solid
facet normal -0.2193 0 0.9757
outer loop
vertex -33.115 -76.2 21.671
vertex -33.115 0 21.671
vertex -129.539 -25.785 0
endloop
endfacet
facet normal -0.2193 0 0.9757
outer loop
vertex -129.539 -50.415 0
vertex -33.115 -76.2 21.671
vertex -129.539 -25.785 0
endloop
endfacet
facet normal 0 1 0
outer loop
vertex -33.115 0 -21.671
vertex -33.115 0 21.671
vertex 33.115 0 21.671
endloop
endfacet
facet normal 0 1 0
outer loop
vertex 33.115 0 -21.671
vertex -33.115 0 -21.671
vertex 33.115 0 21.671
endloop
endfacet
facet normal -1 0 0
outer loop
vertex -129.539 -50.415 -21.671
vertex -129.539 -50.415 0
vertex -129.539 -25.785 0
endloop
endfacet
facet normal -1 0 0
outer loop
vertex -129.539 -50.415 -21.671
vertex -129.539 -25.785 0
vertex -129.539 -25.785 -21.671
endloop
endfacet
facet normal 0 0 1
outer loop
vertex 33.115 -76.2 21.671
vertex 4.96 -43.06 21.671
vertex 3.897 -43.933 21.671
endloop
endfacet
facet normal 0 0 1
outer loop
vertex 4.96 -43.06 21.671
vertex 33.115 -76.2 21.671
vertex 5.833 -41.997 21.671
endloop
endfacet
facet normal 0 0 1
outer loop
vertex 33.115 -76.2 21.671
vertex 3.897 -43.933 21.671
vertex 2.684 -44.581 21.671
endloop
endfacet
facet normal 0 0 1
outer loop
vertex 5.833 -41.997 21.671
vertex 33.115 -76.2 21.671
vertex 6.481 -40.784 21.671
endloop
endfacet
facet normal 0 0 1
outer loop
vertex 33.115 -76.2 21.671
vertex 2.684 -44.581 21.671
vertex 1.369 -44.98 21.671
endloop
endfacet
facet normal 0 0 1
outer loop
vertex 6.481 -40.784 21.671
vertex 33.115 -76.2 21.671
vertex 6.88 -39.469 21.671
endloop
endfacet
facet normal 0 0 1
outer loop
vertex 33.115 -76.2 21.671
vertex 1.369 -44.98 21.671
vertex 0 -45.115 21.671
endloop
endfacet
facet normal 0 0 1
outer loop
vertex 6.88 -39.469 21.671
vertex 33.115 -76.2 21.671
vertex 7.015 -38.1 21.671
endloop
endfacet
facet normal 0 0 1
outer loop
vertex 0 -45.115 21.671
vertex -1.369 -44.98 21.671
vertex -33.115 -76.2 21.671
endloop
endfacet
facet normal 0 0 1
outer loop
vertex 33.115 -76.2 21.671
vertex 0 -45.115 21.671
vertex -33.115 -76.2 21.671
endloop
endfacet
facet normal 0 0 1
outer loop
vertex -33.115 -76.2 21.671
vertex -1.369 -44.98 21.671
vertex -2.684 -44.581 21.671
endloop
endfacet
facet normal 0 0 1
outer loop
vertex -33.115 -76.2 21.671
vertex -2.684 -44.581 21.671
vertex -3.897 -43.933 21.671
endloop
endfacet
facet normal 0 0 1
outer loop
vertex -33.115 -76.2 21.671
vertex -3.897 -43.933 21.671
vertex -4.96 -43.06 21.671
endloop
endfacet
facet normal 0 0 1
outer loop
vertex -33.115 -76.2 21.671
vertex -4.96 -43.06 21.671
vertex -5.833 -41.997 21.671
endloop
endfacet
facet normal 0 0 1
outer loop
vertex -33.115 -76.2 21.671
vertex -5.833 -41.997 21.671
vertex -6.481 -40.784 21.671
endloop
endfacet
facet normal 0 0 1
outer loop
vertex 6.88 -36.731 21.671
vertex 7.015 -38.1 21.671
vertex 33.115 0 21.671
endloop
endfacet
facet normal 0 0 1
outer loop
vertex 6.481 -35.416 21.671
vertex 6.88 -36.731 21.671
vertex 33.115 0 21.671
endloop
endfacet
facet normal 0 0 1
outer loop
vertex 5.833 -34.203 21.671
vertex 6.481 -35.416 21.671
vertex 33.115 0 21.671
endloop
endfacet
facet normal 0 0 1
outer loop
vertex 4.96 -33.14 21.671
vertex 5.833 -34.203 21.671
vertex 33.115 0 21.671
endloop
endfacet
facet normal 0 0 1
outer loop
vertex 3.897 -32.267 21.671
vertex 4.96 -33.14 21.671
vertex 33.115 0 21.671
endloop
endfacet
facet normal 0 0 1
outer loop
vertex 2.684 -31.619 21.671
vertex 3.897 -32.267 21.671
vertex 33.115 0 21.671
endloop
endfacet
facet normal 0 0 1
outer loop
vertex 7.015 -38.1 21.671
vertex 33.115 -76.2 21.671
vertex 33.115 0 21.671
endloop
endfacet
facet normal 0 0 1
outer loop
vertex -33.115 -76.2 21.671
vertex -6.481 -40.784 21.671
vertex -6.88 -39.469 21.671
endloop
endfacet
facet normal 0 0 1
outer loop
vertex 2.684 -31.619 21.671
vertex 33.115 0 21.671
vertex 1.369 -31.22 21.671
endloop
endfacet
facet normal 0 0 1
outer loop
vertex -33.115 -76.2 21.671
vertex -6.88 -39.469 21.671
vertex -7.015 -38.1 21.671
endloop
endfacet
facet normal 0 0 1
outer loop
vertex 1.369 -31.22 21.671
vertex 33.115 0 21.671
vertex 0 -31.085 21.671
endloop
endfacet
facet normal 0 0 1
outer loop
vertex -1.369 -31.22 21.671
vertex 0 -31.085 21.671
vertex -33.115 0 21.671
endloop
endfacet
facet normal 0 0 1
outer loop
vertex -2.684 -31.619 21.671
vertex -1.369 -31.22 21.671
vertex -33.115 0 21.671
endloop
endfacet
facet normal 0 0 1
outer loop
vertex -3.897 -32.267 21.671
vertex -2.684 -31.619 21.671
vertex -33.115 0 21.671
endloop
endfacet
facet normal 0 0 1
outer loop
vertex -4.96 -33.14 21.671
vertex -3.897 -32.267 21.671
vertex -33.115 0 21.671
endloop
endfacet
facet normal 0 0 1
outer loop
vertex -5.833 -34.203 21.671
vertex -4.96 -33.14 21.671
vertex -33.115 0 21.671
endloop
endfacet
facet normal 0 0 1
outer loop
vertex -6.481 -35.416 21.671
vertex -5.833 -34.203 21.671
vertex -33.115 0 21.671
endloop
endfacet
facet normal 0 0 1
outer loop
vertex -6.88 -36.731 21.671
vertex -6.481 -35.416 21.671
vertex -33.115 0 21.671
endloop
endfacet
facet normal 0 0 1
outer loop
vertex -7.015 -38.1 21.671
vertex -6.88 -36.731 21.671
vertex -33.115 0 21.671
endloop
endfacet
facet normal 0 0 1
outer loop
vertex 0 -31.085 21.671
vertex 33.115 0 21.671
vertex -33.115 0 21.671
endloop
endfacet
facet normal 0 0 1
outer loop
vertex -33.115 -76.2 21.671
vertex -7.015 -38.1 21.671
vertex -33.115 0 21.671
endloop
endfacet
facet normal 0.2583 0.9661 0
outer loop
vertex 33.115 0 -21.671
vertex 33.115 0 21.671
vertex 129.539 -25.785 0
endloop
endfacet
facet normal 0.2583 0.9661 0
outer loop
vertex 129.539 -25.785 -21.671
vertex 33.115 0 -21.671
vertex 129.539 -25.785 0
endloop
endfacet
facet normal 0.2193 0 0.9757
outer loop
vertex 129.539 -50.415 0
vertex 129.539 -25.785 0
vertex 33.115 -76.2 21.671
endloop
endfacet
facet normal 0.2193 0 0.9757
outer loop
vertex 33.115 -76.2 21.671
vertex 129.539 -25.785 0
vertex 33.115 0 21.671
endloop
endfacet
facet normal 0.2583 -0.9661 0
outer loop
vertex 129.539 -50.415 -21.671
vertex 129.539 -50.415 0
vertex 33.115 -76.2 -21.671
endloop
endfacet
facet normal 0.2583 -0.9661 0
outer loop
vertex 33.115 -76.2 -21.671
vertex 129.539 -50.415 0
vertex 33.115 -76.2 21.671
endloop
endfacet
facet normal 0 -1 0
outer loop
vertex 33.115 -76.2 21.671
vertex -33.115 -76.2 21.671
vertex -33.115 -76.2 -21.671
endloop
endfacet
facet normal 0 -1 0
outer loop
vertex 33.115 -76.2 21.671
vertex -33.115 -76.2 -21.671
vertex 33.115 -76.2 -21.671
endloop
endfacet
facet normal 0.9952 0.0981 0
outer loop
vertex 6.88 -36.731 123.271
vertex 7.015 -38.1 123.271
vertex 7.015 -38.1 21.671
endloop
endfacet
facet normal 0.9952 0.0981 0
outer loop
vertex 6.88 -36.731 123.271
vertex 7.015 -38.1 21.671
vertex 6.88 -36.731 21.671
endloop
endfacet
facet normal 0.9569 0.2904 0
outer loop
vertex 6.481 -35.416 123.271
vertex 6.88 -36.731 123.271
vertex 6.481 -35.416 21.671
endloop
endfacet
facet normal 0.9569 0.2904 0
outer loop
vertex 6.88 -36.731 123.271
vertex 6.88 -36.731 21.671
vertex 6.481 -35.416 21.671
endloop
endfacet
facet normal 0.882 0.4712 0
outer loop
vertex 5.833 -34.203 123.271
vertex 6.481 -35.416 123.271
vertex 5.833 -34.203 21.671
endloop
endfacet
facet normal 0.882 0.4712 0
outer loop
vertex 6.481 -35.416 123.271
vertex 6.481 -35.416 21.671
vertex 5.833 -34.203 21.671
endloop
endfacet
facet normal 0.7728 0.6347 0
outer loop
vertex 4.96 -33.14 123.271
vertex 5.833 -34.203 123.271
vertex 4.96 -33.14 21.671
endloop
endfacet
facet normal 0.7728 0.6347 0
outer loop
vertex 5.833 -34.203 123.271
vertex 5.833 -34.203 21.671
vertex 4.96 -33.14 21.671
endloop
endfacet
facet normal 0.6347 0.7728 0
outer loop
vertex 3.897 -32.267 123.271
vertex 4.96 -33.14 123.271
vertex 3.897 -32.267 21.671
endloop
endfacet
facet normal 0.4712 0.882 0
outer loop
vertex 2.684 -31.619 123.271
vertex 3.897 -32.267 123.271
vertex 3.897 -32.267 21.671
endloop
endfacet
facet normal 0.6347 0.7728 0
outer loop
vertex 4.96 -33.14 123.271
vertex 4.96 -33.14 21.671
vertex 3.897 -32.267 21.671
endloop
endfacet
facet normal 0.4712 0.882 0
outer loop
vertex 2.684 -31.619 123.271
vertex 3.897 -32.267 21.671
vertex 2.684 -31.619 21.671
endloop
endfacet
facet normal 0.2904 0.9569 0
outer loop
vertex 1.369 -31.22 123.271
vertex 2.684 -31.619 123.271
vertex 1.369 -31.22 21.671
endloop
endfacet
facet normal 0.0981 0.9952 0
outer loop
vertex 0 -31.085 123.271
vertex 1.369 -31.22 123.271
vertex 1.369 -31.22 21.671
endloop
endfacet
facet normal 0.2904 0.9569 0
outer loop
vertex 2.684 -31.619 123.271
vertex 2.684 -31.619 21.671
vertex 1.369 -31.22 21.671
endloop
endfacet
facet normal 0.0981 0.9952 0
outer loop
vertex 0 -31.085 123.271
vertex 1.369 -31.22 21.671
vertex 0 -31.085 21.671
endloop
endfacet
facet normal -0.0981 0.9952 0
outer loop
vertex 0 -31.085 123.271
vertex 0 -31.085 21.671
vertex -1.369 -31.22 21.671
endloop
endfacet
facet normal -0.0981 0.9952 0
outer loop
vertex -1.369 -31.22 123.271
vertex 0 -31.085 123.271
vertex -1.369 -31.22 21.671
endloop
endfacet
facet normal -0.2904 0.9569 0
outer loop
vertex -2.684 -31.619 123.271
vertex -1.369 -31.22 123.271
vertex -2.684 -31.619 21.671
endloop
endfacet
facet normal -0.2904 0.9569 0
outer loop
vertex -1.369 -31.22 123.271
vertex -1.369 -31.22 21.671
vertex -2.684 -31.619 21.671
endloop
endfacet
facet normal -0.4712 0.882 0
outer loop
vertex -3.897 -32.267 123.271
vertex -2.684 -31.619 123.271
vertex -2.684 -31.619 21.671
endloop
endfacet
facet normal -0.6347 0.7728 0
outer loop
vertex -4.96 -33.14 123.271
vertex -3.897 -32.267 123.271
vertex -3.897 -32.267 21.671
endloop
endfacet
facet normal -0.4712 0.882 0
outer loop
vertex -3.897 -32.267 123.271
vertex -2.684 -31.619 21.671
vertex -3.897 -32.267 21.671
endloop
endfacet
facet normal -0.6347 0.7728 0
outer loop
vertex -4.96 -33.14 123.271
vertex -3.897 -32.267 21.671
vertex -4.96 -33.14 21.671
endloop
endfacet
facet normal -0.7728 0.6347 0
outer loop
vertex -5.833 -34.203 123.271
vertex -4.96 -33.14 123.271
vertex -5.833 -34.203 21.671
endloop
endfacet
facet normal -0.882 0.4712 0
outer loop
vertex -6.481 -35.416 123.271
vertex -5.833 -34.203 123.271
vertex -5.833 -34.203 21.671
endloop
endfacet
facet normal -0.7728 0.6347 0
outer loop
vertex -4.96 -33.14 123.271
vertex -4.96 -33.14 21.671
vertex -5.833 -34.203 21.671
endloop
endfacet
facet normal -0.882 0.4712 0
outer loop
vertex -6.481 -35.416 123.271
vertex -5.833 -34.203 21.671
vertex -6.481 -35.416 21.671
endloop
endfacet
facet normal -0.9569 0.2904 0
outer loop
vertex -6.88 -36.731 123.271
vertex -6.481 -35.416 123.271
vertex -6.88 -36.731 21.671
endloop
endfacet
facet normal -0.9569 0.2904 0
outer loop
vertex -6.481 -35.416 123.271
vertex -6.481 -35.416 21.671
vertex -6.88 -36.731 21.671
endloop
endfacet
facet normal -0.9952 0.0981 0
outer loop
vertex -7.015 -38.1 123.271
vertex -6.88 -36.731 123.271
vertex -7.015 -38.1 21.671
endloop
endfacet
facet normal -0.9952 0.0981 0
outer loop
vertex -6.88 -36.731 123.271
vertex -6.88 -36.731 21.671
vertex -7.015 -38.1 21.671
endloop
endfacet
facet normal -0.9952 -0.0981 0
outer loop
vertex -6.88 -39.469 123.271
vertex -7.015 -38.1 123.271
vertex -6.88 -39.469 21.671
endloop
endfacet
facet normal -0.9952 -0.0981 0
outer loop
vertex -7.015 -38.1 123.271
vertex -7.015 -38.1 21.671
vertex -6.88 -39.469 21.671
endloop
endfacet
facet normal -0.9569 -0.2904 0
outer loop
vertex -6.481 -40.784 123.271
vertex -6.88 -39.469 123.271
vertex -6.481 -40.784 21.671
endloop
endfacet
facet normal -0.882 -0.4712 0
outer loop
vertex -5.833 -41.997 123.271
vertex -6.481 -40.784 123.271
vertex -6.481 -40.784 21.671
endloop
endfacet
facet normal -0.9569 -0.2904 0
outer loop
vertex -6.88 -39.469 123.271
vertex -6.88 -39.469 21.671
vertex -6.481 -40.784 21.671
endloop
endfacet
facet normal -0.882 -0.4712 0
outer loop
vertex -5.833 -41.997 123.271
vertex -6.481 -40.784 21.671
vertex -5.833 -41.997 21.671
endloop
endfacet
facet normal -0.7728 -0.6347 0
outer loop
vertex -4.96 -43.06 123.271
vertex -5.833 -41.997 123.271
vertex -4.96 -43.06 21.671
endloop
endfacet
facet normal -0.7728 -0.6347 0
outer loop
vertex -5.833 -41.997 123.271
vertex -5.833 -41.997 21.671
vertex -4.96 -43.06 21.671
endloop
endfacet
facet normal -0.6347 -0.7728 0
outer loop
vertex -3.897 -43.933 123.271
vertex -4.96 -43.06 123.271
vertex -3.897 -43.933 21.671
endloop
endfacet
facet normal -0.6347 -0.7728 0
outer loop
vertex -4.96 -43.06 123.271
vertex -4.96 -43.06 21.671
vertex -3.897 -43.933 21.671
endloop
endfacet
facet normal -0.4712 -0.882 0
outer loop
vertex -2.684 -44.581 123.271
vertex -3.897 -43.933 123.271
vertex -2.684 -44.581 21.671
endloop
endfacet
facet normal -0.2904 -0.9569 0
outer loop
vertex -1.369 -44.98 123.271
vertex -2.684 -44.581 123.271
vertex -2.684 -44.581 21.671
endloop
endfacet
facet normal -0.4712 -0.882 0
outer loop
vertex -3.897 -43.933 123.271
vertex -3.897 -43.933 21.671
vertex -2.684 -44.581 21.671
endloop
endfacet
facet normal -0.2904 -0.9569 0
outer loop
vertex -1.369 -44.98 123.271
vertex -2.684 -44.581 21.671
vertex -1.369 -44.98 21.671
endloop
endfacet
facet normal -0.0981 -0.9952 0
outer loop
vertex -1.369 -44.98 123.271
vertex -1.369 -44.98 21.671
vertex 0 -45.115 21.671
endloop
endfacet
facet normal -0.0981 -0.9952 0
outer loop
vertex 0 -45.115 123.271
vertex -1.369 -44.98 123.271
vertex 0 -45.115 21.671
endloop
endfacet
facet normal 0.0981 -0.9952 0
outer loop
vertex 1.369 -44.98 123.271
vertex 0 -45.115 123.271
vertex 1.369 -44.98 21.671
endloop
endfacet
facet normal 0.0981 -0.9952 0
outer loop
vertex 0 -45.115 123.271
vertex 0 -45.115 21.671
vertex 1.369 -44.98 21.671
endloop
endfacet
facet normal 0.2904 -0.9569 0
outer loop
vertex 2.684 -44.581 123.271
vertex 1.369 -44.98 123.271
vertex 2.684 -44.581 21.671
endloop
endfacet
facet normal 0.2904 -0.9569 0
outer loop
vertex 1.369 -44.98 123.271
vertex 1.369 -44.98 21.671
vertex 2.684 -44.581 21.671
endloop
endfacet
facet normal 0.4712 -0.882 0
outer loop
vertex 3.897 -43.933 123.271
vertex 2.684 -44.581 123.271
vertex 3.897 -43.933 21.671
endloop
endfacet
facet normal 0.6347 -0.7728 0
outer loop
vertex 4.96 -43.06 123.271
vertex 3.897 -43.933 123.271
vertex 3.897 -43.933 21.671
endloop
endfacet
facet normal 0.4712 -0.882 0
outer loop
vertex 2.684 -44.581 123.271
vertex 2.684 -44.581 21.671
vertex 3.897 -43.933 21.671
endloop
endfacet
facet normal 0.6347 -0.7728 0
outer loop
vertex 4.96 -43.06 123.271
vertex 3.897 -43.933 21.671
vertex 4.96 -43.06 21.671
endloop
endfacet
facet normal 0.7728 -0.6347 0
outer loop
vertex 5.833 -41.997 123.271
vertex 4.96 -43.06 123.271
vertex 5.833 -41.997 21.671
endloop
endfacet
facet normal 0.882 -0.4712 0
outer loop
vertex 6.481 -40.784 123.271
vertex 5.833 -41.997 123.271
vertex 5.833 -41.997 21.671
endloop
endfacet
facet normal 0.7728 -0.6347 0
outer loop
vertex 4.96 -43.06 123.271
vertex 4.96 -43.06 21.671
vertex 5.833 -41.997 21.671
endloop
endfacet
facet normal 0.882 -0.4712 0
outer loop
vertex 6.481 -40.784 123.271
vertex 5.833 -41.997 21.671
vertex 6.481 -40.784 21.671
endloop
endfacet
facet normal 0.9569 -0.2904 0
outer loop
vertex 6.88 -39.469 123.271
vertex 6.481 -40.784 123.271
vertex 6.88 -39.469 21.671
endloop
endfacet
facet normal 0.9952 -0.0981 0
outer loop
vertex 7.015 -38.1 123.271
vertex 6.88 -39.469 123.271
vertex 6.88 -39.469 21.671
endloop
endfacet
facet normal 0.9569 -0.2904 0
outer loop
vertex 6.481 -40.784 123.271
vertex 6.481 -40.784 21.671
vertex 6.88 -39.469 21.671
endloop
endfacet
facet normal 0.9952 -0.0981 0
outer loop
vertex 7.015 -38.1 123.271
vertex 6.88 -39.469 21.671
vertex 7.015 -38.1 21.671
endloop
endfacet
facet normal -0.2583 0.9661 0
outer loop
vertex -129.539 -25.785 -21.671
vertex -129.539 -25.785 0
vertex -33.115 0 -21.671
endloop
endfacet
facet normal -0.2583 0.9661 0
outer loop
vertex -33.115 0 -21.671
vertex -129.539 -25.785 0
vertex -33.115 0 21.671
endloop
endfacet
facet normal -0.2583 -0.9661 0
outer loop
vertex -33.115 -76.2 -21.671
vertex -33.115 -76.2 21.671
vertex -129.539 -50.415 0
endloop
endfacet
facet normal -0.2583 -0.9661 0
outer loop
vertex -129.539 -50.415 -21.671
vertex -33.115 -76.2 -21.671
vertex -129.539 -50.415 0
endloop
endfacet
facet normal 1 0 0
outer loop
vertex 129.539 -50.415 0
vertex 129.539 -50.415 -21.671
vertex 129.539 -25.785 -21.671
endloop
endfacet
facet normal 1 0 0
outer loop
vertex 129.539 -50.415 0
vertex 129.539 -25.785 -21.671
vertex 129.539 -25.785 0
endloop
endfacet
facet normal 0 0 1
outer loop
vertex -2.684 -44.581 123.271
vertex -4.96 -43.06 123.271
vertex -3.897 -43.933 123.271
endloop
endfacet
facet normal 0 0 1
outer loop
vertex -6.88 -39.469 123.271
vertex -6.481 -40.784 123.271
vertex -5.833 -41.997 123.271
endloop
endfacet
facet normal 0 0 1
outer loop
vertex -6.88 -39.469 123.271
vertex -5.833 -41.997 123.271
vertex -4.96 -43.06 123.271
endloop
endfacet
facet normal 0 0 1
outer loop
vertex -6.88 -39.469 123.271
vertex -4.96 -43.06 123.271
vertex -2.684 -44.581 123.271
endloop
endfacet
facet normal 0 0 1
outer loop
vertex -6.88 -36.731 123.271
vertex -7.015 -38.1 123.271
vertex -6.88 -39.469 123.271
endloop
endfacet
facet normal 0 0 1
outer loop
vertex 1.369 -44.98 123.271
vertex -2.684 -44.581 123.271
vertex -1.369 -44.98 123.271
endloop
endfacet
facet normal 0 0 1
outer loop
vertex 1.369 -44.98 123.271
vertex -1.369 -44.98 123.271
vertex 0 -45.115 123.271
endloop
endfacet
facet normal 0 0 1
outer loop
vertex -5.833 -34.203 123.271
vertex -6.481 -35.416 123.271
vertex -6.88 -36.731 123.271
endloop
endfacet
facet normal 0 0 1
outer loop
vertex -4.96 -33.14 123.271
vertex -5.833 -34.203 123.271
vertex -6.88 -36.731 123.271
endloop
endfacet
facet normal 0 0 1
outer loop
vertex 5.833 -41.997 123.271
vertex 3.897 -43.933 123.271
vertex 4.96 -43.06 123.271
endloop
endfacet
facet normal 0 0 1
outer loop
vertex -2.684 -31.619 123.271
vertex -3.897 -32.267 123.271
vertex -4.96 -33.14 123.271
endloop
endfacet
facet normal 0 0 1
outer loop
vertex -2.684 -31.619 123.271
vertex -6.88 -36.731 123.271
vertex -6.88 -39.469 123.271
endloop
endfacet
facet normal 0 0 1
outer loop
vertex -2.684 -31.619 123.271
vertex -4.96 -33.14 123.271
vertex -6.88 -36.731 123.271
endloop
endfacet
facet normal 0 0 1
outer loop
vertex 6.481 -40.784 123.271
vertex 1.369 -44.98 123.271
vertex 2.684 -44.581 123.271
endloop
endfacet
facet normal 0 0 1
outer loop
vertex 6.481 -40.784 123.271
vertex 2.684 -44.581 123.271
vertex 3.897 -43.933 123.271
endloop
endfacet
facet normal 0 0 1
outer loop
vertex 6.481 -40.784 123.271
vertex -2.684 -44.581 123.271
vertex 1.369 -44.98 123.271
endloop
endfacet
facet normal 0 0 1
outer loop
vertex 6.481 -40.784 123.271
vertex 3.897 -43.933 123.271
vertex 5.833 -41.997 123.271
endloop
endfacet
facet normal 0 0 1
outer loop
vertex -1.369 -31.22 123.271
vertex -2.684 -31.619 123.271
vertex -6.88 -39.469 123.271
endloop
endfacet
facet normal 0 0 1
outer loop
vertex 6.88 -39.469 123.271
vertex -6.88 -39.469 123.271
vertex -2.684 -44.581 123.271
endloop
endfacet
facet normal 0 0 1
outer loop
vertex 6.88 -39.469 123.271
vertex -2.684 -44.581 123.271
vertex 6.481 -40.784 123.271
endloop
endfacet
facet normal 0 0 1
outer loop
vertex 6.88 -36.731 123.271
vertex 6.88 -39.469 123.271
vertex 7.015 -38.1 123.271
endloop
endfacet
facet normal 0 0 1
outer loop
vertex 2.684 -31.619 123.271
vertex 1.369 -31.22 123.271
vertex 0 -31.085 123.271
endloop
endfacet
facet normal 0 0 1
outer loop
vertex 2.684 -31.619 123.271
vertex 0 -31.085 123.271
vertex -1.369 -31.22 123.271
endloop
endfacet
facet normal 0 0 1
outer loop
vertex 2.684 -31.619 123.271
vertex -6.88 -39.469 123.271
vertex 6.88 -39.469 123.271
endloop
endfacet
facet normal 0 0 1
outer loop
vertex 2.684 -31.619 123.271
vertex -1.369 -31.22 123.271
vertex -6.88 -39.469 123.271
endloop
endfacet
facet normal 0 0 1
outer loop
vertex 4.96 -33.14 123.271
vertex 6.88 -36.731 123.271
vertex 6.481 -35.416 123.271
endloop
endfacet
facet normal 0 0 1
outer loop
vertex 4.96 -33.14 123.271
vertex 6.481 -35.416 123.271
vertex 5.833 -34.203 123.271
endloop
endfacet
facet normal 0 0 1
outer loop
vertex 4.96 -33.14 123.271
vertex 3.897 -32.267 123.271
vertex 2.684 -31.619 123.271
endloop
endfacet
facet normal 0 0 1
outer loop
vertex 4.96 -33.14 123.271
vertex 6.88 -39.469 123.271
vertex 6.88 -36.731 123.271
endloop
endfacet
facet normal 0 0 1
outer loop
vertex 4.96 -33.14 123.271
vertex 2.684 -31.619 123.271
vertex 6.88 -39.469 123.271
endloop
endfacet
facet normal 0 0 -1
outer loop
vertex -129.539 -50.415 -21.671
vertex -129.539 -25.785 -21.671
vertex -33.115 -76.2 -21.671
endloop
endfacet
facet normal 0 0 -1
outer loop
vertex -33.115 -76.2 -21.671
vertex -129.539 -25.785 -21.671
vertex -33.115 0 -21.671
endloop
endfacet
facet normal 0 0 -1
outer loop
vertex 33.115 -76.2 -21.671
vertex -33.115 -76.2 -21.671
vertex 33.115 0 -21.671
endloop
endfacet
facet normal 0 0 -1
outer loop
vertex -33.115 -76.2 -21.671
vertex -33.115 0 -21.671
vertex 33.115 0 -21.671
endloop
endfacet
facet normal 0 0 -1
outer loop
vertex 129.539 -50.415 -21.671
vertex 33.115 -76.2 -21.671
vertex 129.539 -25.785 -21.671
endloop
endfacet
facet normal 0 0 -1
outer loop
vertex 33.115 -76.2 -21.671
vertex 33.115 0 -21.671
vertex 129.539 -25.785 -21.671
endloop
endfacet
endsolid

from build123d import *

# Parameters (mm, degrees)
F1_DEPTH = 76.2
F2_R     = 7.014916
F3_DEPTH = 101.6
F5_DEPTH = 76.2
F6_DEPTH = 76.2


with BuildPart() as f1:
    # F0 (on Front) → F1 (new body)
    with BuildSketch(Plane.XZ):
        Polygon((129.538909, 0), (33.115212, 21.670986), (14.60965, 21.670986), (0, 21.670986), (-33.115212, 21.670986), (-129.538909, 0), (-129.538909, -21.670986), (129.538909, -21.670986), align=None)
    extrude(amount=F1_DEPTH)

    # F2 (on face) → F3 (join)
    with BuildSketch(Plane.XY.offset(21.670986)):
        with Locations((0, -38.1)):
            Circle(F2_R)
    extrude(amount=F3_DEPTH)

    # F4 (on face) → F5 (cut)
    with BuildSketch(Plane.XY.offset(21.670986)):
        Polygon((134.795412, 6.28761), (33.115212, 0), (134.795412, -27.191089), align=None)
    extrude(amount=-F5_DEPTH, mode=Mode.SUBTRACT)

    # F4 (on face) → F6 (cut)
    with BuildSketch(Plane.XY.offset(21.670986)):
        Polygon((134.795412, 6.28761), (33.115212, 0), (134.795412, -27.191089), align=None)
        Polygon((-134.795412, -27.191089), (-33.115212, 0), (-134.795412, 6.28761), align=None)
        Polygon((134.795412, -49.008911), (33.115212, -76.2), (134.795412, -82.48761), align=None)
        Polygon((-134.795412, -82.48761), (-33.115212, -76.2), (-134.795412, -49.008911), align=None)
    extrude(amount=-F6_DEPTH, mode=Mode.SUBTRACT)


solid = f1.part
